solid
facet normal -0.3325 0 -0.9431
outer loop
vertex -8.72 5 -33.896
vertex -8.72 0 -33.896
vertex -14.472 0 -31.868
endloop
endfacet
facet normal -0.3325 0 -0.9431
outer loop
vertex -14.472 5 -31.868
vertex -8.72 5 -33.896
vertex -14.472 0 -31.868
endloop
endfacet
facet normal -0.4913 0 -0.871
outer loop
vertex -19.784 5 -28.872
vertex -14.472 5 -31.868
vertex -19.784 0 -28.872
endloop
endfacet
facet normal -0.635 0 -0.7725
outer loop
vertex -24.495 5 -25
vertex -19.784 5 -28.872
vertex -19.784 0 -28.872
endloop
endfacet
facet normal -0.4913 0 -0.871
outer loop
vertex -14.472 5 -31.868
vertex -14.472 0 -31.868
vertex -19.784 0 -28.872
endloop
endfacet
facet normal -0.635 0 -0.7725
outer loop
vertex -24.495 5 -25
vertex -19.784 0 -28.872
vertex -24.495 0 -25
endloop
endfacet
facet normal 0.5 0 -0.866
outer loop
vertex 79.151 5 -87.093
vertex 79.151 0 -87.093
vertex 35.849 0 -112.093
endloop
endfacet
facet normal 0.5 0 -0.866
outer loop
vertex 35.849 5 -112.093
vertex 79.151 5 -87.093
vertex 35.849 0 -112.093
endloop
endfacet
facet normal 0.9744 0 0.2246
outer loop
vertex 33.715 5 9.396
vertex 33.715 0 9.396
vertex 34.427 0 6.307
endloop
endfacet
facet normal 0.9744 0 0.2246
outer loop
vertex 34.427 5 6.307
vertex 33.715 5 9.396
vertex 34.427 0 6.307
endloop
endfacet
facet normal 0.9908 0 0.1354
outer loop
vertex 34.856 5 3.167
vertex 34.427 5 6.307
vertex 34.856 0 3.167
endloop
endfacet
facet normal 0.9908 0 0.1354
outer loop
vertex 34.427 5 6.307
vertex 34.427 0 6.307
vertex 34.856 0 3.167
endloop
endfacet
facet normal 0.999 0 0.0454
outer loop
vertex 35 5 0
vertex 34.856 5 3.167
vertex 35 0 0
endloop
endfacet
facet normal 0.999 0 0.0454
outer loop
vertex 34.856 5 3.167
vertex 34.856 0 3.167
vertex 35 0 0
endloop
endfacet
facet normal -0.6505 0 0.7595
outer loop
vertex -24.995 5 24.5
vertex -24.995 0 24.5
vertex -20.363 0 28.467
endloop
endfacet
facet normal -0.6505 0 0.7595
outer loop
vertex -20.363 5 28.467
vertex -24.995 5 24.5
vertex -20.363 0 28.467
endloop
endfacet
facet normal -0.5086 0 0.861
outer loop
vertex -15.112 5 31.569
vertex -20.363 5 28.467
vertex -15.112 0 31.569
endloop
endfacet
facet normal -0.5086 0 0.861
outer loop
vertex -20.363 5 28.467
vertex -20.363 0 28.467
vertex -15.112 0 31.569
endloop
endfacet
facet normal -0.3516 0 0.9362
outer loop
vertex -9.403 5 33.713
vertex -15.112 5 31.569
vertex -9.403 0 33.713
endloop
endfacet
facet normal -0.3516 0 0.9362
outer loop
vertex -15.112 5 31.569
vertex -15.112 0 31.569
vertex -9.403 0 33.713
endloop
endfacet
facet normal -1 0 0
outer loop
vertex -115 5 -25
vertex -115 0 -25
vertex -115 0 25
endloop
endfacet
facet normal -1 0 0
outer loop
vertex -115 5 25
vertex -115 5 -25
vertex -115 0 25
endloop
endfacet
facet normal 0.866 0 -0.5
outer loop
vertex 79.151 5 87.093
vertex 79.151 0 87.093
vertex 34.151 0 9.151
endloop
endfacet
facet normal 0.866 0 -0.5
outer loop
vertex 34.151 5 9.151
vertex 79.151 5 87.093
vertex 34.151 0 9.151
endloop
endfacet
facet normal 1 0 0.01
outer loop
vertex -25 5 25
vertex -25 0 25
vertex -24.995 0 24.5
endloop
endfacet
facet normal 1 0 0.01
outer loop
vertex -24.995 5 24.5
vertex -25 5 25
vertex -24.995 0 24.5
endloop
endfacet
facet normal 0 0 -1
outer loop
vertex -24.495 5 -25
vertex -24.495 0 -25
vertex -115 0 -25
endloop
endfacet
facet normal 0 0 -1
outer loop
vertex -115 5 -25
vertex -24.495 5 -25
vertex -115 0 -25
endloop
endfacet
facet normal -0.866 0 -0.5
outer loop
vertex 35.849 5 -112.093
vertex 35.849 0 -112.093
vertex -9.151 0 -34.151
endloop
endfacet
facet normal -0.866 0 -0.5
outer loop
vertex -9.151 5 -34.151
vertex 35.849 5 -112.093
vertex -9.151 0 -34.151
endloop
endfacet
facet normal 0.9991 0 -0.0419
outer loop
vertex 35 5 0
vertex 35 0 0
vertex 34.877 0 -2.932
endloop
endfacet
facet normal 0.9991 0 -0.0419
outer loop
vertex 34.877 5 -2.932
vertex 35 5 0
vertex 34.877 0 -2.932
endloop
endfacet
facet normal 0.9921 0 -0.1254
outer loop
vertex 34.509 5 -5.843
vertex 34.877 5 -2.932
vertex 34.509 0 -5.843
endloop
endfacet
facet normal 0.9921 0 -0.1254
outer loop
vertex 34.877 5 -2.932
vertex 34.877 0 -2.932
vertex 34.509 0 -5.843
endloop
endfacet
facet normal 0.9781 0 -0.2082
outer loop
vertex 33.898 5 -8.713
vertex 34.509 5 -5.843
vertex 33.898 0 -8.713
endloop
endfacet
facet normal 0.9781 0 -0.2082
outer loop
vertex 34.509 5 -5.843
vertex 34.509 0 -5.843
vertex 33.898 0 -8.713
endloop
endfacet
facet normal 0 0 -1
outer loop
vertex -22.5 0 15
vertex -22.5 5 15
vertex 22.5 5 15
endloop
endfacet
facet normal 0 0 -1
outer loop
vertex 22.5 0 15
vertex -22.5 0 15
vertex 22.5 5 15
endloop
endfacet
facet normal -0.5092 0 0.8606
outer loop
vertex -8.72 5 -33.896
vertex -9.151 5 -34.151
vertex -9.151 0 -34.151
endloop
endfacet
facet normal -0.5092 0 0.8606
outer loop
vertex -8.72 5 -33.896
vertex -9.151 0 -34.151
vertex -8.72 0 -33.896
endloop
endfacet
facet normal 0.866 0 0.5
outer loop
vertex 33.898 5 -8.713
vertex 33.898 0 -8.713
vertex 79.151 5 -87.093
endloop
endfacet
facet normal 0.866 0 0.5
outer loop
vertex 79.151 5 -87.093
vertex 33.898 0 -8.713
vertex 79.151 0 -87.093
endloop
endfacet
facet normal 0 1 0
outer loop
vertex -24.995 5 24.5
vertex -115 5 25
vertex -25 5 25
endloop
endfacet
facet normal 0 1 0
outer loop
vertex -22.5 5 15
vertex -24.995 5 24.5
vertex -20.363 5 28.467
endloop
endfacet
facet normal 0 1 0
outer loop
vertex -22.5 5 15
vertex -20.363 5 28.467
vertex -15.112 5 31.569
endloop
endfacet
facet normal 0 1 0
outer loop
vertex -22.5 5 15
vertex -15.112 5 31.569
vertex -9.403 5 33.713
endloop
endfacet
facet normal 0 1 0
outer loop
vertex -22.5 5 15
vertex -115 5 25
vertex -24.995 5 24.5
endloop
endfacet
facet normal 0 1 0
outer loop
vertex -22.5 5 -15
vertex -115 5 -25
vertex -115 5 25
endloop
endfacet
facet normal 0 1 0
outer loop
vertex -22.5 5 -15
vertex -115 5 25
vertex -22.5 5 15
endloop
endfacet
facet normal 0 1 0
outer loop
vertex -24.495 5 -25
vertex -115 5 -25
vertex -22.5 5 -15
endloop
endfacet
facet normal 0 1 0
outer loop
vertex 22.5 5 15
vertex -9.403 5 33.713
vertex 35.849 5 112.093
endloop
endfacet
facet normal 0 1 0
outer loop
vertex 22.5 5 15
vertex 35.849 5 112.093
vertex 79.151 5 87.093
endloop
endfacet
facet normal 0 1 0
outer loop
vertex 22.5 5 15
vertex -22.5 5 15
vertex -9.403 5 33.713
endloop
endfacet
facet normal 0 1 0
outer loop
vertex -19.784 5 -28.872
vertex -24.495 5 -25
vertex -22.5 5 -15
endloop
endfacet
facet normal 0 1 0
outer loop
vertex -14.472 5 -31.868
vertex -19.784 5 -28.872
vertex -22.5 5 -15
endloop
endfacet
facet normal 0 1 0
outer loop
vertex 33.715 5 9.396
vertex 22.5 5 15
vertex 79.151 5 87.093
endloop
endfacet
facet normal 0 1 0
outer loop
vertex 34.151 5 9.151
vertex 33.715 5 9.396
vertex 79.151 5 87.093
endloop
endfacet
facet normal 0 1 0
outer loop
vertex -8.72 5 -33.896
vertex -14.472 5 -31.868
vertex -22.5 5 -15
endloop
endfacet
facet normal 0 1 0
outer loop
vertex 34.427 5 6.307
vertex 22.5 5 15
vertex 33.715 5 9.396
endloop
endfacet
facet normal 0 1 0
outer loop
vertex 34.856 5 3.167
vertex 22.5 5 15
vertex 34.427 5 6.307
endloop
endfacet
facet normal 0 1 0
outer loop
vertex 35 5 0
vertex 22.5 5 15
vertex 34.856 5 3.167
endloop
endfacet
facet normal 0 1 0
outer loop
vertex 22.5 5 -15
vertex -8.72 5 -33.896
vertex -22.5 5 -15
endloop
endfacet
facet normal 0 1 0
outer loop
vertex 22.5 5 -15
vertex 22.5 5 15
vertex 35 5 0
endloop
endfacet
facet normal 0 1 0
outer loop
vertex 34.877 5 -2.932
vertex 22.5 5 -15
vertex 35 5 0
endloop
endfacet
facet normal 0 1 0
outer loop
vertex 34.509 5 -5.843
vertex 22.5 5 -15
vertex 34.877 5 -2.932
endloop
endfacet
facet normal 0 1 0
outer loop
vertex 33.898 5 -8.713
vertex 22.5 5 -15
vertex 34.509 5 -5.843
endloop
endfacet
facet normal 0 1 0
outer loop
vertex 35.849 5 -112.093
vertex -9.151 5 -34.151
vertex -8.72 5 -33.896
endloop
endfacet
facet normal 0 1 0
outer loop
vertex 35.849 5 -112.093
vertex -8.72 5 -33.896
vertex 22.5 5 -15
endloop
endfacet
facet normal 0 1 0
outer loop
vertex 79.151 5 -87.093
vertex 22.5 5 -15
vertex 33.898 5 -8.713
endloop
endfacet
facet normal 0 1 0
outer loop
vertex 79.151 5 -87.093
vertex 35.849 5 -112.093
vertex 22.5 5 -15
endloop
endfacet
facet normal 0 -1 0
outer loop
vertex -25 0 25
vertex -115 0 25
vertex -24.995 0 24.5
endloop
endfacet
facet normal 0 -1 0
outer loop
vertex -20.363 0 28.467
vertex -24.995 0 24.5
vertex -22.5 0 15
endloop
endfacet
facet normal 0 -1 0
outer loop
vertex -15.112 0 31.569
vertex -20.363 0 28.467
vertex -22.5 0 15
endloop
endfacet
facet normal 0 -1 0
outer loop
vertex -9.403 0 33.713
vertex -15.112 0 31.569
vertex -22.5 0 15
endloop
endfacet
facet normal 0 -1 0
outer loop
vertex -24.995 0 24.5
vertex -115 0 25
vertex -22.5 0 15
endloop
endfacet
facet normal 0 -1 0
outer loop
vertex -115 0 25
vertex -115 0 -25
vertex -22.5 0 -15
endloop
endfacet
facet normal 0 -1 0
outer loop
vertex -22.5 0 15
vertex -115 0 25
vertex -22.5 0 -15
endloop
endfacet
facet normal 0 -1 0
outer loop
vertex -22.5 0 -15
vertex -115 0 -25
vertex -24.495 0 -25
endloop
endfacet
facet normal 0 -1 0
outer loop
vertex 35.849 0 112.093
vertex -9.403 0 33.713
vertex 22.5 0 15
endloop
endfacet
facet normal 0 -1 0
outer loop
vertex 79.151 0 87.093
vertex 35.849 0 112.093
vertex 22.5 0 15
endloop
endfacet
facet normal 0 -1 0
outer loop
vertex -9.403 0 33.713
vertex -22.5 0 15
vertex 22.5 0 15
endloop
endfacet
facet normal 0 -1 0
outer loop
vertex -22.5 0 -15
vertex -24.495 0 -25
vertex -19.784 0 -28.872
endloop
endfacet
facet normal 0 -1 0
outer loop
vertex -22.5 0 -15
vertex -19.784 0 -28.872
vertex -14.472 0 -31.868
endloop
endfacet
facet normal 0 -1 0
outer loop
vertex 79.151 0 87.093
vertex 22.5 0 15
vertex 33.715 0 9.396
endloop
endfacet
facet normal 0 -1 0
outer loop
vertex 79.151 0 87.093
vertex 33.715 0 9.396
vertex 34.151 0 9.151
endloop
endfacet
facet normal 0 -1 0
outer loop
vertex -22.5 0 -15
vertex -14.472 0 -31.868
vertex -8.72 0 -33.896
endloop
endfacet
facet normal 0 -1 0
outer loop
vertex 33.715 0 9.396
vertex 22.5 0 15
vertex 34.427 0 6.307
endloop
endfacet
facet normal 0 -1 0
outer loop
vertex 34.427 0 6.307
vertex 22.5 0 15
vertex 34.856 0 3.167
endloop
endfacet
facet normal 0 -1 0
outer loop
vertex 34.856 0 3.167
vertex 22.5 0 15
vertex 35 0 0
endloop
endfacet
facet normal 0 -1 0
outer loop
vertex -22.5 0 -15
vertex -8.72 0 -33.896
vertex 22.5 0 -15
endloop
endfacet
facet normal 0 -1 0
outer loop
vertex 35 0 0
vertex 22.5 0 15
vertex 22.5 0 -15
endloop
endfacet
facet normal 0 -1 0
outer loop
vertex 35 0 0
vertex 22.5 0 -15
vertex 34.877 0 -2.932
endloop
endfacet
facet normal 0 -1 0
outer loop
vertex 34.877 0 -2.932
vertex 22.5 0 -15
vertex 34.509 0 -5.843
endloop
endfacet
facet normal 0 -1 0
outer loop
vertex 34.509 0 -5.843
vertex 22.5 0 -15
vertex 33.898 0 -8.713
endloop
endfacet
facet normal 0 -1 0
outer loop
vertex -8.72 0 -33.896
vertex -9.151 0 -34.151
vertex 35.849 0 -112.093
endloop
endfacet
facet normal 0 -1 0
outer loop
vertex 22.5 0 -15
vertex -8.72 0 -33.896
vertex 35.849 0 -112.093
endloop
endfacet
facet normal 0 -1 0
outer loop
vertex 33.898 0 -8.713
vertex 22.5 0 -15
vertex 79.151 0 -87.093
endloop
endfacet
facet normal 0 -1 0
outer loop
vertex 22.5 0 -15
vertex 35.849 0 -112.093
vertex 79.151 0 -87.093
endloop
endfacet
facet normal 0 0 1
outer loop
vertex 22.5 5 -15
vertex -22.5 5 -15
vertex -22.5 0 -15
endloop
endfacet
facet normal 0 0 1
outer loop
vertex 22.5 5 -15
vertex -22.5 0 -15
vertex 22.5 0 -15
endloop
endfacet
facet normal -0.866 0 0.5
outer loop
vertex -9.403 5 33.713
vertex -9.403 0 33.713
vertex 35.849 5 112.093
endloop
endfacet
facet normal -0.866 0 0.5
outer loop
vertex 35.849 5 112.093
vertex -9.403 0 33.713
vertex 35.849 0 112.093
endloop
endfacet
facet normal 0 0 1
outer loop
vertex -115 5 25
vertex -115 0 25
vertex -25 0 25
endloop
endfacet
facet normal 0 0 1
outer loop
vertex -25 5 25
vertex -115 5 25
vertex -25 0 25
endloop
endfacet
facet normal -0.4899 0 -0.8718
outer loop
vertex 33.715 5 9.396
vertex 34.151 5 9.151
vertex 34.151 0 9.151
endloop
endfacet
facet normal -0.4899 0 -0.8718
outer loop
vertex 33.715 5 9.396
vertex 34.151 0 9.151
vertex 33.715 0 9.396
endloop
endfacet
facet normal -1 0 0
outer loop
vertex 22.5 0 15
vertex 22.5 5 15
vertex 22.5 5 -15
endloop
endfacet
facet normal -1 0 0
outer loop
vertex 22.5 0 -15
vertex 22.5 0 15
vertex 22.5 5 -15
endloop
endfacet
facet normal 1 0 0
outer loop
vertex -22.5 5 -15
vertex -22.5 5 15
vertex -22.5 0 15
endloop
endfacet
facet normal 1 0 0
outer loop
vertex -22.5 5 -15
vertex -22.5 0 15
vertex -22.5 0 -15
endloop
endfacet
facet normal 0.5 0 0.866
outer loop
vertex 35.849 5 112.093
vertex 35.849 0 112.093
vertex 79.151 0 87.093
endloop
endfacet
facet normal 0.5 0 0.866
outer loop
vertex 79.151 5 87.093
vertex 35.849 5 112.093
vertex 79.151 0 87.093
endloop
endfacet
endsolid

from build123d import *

# Parameters (mm, degrees)
ESQUISSE3_R             = 35
BOSS_EXTRU_3_DEPTH      = 5
ESQUISSE4_W             = 45
ESQUISSE4_H             = 30
ENL_V_MAT_EXTRU_1_DEPTH = 161.669919512


with BuildPart() as part:
    # Esquisse3 → Boss.-Extru.3 (new body)
    with BuildSketch(Plane(origin=(0, 0, 0), x_dir=(1, 0, 0), z_dir=(0, 1, 0))):
        with BuildLine():
            Line((-115, -25), (-25, -25))
            Line((-25, -25), (-24.99494949, -24.500051021))
            ThreePointArc((-24.99494949, -24.500051021), (-34.998214236, 0.353553761), (-24.494897428, 25))
            Line((-24.494897428, 25), (-25, 25))
            Line((-25, 25), (-115, 25))
            Line((-115, 25), (-115, -25))
        make_face()
        Circle(ESQUISSE3_R)
        Polygon((-9.403186381, -33.713203436), (35.849364905, -112.092921435), (79.150635095, -87.092921435), (34.150635095, -9.150635095), align=None)
        with BuildLine():
            Line((-24.494897428, 25), (-24.99494949, -24.500051021))
            ThreePointArc((-24.99494949, -24.500051021), (-17.805293657, -30.132565736), (-9.403186381, -33.713203436))
            Line((-9.403186381, -33.713203436), (33.715141323, -9.396235714))
            ThreePointArc((33.715141323, -9.396235714), (34.677297662, -4.741837919), (35, 0))
            ThreePointArc((35, 0), (34.72342821, 4.391302011), (33.898083809, 8.713203436))
            Line((33.898083809, 8.713203436), (-8.720191833, 33.896286735))
            ThreePointArc((-8.720191833, 33.896286735), (-17.19292058, 30.486119496), (-24.494897428, 25))
        make_face()
        Circle(ESQUISSE3_R)
        Polygon((33.898083809, 8.713203436), (79.150635095, 87.092921435), (35.849364905, 112.092921435), (-9.150635095, 34.150635095), align=None)
        with BuildLine():
            ThreePointArc((33.898083809, 8.713203436), (17.805293657, 30.132565736), (-8.720191833, 33.896286735))
            Line((-8.720191833, 33.896286735), (33.898083809, 8.713203436))
        make_face()
    extrude(amount=BOSS_EXTRU_3_DEPTH)

    # Esquisse4 → Enlèv. mat.-Extru.1 (cut, through all)
    with BuildSketch(Plane(origin=(0, 5, 0), x_dir=(1, 0, 0), z_dir=(0, 1, 0))):
        Rectangle(ESQUISSE4_W, ESQUISSE4_H)
    extrude(amount=-ENL_V_MAT_EXTRU_1_DEPTH, mode=Mode.SUBTRACT)


solid = part.part
